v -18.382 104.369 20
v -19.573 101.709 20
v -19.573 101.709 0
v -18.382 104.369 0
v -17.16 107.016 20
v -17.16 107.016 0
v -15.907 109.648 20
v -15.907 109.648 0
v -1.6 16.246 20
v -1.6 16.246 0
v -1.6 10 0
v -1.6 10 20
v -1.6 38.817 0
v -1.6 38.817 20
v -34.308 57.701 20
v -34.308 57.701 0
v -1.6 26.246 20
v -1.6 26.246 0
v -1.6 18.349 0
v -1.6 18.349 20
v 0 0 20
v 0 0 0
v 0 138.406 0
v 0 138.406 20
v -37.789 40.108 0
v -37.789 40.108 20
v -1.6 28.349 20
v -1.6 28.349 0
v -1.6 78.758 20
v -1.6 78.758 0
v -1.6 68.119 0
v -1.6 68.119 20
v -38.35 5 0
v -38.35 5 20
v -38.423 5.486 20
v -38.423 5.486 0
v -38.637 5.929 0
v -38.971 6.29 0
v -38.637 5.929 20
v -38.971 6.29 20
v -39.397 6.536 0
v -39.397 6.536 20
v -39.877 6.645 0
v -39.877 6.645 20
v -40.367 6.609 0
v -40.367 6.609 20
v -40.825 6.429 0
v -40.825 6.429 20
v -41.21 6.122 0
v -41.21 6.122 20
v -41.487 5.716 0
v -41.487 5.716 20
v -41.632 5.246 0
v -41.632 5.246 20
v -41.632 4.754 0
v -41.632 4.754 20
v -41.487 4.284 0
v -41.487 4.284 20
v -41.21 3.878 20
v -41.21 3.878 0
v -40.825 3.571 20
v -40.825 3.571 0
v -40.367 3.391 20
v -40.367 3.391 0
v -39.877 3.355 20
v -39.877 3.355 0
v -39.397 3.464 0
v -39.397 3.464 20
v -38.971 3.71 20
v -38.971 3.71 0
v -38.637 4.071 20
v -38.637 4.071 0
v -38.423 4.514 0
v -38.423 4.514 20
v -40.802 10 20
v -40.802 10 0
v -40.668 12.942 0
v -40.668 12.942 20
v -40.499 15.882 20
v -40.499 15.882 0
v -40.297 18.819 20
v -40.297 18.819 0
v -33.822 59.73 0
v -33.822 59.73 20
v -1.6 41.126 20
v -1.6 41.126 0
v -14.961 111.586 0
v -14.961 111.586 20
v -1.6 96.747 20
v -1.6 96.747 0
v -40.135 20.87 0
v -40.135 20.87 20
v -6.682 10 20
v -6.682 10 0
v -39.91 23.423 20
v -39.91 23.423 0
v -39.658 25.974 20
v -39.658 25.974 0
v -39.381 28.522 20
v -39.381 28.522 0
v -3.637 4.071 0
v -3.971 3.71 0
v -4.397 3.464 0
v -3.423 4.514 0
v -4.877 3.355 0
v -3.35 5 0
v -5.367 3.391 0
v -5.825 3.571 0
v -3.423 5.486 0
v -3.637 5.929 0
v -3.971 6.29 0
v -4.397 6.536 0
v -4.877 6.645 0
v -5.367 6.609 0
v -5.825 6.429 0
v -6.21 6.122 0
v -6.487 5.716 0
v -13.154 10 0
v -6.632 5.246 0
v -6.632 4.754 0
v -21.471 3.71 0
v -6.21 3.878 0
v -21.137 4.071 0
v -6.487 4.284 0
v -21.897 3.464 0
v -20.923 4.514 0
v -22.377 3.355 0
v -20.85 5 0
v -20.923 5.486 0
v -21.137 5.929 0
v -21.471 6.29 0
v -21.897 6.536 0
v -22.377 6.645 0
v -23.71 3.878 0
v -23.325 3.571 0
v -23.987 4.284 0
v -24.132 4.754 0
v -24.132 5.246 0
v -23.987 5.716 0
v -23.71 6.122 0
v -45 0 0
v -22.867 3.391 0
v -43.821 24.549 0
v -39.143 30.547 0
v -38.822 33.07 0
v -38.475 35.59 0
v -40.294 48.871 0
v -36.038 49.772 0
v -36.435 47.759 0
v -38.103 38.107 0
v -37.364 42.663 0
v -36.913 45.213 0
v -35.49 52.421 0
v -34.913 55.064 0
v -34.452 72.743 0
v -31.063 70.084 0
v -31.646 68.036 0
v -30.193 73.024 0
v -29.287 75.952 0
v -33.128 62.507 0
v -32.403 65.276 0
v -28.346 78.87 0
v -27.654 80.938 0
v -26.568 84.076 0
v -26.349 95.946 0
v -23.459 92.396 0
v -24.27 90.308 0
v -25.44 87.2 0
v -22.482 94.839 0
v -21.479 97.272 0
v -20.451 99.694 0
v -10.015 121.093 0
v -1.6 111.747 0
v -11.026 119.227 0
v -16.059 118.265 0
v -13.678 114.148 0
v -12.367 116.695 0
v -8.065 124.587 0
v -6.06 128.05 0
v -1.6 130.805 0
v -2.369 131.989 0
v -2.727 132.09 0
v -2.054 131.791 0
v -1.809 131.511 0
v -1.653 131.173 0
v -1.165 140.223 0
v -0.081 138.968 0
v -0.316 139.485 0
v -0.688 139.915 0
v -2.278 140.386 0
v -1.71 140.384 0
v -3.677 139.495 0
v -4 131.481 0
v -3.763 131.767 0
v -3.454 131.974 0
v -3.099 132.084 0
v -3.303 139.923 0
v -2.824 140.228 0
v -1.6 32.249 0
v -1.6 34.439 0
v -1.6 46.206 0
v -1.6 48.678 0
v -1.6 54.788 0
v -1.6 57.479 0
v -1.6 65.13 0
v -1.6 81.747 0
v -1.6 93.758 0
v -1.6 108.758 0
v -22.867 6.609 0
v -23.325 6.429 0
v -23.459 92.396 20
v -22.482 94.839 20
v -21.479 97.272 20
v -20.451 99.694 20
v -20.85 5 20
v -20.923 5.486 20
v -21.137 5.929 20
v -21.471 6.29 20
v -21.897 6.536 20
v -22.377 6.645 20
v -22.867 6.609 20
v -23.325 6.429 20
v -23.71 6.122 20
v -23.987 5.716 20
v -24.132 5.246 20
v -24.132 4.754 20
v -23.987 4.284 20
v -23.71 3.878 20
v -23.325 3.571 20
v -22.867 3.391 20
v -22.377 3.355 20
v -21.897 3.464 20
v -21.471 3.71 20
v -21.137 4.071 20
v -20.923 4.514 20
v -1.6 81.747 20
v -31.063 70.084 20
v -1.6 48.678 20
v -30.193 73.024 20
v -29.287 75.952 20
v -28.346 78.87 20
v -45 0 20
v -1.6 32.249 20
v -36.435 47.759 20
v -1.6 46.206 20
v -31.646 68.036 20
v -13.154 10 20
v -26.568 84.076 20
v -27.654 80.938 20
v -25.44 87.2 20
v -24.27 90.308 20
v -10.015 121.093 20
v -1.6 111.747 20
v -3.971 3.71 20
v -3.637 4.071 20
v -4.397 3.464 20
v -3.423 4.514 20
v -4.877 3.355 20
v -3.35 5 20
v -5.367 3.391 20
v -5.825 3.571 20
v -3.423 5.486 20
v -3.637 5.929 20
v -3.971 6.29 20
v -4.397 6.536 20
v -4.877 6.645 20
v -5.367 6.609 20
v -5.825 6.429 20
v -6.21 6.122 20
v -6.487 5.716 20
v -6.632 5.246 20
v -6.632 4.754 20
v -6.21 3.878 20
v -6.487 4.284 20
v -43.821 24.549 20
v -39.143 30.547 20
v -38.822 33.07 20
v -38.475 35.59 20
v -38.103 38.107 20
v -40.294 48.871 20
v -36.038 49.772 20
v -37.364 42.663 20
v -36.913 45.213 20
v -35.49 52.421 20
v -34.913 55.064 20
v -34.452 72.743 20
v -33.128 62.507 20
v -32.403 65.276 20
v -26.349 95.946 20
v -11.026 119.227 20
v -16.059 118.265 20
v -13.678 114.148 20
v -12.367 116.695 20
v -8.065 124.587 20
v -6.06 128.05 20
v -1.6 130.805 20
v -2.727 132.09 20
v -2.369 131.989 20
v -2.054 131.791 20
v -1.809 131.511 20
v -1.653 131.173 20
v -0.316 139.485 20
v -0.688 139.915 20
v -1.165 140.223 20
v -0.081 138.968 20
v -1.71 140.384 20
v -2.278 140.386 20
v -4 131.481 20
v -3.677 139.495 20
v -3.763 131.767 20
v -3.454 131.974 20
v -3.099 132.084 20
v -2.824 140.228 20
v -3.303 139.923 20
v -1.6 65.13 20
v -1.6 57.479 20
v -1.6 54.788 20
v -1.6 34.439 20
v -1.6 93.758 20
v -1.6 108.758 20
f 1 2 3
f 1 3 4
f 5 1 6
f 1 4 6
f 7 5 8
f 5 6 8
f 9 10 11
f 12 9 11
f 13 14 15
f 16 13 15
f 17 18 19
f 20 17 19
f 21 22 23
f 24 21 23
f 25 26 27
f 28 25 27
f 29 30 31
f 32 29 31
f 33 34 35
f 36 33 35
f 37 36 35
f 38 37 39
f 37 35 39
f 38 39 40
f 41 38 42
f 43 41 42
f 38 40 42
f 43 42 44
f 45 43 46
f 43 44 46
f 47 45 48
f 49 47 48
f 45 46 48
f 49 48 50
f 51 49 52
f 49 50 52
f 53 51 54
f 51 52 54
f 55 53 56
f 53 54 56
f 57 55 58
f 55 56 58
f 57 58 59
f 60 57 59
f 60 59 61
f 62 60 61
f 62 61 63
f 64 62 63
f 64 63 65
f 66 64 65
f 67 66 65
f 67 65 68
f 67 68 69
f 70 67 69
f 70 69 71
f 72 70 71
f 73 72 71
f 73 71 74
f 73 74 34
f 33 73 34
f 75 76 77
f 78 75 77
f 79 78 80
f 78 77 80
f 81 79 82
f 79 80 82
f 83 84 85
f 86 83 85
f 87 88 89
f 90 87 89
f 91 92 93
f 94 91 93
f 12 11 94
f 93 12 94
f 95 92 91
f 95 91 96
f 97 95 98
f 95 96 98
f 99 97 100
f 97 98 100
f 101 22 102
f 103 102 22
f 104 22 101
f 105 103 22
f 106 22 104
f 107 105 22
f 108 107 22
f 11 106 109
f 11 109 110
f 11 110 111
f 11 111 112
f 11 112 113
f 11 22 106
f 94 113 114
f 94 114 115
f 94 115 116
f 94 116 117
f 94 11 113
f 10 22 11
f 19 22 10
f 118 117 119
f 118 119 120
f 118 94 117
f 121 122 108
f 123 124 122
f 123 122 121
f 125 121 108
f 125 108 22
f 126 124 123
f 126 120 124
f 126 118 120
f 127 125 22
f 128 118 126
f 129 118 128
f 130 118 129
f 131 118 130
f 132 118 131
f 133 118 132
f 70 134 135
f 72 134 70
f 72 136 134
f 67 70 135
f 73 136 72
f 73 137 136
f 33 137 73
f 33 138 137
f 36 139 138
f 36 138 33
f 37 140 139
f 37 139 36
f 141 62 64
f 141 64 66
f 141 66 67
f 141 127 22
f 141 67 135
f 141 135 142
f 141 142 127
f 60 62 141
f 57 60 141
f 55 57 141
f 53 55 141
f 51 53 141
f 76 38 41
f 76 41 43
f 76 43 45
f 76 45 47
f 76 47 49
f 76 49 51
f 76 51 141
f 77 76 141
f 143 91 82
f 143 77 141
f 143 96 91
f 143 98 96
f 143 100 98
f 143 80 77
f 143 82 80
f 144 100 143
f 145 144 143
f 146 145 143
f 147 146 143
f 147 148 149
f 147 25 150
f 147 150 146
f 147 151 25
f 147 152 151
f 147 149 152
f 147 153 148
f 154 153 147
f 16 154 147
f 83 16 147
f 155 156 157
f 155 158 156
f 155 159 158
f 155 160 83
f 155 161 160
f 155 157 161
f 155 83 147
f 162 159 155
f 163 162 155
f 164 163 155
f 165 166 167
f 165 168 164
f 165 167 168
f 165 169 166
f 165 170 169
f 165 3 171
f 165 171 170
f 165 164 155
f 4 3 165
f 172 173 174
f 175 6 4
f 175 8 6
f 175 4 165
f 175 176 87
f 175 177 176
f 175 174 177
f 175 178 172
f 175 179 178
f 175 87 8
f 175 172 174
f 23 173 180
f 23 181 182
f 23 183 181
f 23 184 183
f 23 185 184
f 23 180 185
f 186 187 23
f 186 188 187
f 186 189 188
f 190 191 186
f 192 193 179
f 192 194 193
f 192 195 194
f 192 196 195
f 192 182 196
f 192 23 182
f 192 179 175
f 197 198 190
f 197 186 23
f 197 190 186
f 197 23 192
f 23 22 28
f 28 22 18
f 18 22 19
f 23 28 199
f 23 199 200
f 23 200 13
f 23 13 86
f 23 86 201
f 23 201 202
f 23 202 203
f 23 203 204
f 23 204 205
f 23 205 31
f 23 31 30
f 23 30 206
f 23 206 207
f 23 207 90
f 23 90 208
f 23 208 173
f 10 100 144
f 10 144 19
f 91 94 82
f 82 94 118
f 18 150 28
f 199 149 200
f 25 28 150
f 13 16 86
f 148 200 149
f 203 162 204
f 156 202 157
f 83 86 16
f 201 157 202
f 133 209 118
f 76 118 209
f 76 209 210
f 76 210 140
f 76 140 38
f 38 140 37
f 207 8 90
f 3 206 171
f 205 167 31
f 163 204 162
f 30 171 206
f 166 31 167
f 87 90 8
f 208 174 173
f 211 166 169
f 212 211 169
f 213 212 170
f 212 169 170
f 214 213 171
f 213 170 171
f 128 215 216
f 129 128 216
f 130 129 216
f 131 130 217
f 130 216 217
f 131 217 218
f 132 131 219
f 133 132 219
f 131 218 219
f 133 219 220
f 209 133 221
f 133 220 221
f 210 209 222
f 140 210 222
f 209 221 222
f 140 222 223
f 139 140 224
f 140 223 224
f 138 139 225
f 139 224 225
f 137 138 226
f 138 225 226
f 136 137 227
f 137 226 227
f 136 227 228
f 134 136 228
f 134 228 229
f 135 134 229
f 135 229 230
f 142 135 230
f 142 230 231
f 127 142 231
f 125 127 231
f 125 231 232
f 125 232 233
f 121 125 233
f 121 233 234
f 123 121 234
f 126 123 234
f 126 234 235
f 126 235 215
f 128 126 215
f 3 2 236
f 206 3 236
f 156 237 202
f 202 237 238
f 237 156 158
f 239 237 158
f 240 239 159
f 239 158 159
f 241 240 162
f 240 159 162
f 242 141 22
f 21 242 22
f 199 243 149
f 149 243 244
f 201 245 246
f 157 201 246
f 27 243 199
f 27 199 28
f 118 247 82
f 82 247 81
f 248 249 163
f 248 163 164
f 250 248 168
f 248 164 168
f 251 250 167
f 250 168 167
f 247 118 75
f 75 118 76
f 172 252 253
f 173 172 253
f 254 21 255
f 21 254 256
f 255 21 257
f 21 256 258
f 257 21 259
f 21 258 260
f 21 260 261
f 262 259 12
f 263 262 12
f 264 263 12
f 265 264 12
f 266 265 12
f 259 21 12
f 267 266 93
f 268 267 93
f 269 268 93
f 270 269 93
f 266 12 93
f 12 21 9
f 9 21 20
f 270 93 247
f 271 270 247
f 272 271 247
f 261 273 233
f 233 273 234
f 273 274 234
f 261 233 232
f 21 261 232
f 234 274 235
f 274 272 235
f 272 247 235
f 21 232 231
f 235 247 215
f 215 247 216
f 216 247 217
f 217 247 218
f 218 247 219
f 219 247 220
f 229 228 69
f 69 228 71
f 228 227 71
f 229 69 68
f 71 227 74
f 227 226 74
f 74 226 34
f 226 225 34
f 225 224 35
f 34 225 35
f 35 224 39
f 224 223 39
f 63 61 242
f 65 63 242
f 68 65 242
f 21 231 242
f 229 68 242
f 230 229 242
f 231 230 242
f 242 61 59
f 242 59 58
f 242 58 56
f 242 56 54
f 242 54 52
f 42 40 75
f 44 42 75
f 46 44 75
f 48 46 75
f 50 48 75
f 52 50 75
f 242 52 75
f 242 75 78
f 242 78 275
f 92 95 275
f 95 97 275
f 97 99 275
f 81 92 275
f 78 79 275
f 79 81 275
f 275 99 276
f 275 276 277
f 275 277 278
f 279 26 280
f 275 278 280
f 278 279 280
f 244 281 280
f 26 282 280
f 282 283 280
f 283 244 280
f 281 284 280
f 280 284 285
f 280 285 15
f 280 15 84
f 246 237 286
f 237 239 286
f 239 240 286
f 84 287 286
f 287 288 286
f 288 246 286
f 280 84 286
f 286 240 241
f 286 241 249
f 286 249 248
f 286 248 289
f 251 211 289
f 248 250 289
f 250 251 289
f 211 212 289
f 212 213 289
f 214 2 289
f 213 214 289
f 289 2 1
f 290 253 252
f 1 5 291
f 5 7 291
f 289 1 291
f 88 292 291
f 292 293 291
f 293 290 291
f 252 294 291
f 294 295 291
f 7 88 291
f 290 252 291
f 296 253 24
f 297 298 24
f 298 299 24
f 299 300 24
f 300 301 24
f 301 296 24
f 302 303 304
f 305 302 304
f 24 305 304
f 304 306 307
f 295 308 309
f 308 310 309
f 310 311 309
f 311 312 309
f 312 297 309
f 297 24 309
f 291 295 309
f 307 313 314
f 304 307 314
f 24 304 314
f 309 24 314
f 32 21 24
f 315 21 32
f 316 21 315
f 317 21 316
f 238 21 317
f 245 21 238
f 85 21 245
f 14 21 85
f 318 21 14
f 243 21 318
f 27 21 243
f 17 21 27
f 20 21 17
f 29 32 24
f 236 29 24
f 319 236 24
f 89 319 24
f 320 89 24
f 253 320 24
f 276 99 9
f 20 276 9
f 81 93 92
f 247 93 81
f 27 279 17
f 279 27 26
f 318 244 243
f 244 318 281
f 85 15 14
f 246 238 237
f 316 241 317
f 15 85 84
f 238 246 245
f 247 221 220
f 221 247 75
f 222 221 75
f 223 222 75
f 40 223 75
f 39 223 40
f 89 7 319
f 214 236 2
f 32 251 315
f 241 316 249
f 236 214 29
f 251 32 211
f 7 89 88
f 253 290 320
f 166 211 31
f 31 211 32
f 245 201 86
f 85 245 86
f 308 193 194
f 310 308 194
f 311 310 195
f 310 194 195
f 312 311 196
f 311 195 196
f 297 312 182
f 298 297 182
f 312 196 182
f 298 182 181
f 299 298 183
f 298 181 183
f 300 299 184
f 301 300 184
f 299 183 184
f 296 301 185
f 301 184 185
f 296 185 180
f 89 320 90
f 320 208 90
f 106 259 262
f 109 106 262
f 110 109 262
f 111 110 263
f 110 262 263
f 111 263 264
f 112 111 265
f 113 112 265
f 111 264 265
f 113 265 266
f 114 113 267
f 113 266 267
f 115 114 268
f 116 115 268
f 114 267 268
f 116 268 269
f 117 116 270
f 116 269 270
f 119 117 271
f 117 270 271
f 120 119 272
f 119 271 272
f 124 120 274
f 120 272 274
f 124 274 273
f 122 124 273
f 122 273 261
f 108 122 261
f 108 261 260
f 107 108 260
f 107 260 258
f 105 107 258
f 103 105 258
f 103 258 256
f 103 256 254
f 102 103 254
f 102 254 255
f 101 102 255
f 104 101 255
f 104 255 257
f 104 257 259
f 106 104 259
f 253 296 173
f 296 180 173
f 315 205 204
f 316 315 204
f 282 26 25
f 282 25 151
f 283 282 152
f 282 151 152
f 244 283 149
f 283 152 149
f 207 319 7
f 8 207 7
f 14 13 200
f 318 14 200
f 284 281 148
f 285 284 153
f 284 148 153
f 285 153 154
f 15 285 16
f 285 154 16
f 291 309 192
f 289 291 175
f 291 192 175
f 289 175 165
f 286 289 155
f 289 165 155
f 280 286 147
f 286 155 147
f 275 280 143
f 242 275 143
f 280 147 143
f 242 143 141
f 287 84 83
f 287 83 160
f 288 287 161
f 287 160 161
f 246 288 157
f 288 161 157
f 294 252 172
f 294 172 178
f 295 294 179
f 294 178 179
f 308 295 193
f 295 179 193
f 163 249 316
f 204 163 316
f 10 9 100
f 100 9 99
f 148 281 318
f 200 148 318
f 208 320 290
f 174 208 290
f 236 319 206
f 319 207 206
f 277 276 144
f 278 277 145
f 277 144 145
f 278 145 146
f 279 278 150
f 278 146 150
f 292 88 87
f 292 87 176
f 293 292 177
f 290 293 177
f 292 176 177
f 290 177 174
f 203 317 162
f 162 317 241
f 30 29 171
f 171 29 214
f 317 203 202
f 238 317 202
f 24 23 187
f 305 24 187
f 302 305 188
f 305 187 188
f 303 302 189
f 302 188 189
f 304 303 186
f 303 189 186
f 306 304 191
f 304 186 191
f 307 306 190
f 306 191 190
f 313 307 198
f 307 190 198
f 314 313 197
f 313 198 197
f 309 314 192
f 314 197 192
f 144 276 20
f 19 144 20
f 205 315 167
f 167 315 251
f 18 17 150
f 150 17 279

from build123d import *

# Parameters (mm, degrees)
BOSS_EXTRUDE4_DEPTH = 20
SKETCH12_R          = 1.65
CUT_EXTRUDE1_DEPTH  = 149.790905386
CUT_EXTRUDE2_START  = -20
CUT_EXTRUDE2_DEPTH  = 20
CUT_EXTRUDE3_START  = -30
CUT_EXTRUDE3_DEPTH  = 30
BOSS_EXTRUDE5_DEPTH = 20
CIRPATTERN1_COUNT   = 6
CIRPATTERN1_ANGLE   = 30
LPATTERN2_COUNT     = 3
LPATTERN2_PITCH     = 10
BOSS_EXTRUDE6_DEPTH = 20
LPATTERN3_COUNT     = 3
LPATTERN3_PITCH     = 15
CUT_EXTRUDE4_START  = -20
CUT_EXTRUDE4_DEPTH  = 20


with BuildPart() as part:
    # Sketch5 → Boss-Extrude4 (new body)
    with BuildSketch(Plane.XY):
        with BuildLine():
            Line((0, 0), (0, 138.405603612))
            ThreePointArc((0, 138.405603612), (-1.431938837, 140.323234054), (-3.677306515, 139.494934991))
            ThreePointArc((-3.677306515, 139.494934991), (-34.45212059, 72.743387818), (-45, 0))
            Line((-45, 0), (0, 0))
        make_face()
        with BuildLine():
            Line((-1.6, 10), (-40.801596678, 10))
            ThreePointArc((-40.801596678, 10), (-30.171322984, 73.09445494), (-4, 131.480881584))
            ThreePointArc((-4, 131.480881584), (-2.54422163, 132.052107892), (-1.6, 130.805498221))
            Line((-1.6, 130.805498221), (-1.6, 10))
        make_face(mode=Mode.SUBTRACT)
    extrude(amount=BOSS_EXTRUDE4_DEPTH)

    # Sketch12 → Cut-Extrude1 (cut, through all)
    with BuildSketch(Plane.XY.offset(20)):
        with Locations((-40, 5)):
            Circle(SKETCH12_R)
        with Locations((-22.5, 5)):
            Circle(SKETCH12_R)
        with Locations((-5, 5)):
            Circle(SKETCH12_R)
    extrude(amount=-CUT_EXTRUDE1_DEPTH, mode=Mode.SUBTRACT)

    # Sketch17 → Cut-Extrude2 (cut)
    with BuildSketch(Plane.XY.offset(20).offset(CUT_EXTRUDE2_START)):
        Polygon((-109.129206393, -31.174044695), (890.870793607, -18.386269912), (884.13367644, 508.454191469), (-120.638203698, 868.825955305), (-717.462714608, 272.001444394), align=None)
        with BuildLine():
            Line((-45, 0), (0, 0))
            Line((0, 0), (0, 138.405603612))
            ThreePointArc((0, 138.405603612), (-0.890765175, 140.069814567), (-2.769598102, 140.25160436))
            ThreePointArc((-2.769598102, 140.25160436), (-57.041683198, 80.109492203), (-45, 0))
        make_face(mode=Mode.SUBTRACT)
    extrude(amount=CUT_EXTRUDE2_DEPTH, mode=Mode.SUBTRACT)

    # Sketch18 → Cut-Extrude3 (cut)
    with BuildSketch(Plane.XY.offset(20).offset(CUT_EXTRUDE3_START)):
        Polygon((10.567687301, -7.152622061), (26.572035637, 318.782087337), (-234.729728554, 306.471050155), (-205.798791176, -46.855716973), align=None)
        with BuildLine():
            Line((-45, 0), (0, 0))
            Line((0, 0), (0, 138.405603612))
            ThreePointArc((0, 138.405603612), (-1.431938837, 140.323234054), (-3.677306515, 139.494934991))
            ThreePointArc((-3.677306515, 139.494934991), (-34.45212059, 72.743387818), (-45, 0))
        make_face(mode=Mode.SUBTRACT)
    extrude(amount=CUT_EXTRUDE3_DEPTH, mode=Mode.SUBTRACT)

    # Sketch14 → Boss-Extrude5 (add)
    with BuildSketch(Plane.XY.offset(20)):
        Polygon((48.4, 10), (-114.101488266, 62.799934205), (-113.483454278, 64.702047237), (49.018033989, 11.902113033), align=None)
    boss_extrude5 = extrude(amount=-BOSS_EXTRUDE5_DEPTH)

    # CirPattern1: Boss-Extrude5 ×6 about axis
    cirpattern1_axis = Axis((49.018033989, 11.902113033, 0), (0, 0, -1))
    for i in range(1, CIRPATTERN1_COUNT):
        add(boss_extrude5.rotate(cirpattern1_axis, i * CIRPATTERN1_ANGLE / (CIRPATTERN1_COUNT - 1)))

    # LPattern2: Boss-Extrude5 ×3
    with Locations(*[(0, -i * LPATTERN2_PITCH, 0) for i in range(1, LPATTERN2_COUNT)]):
        add(boss_extrude5)

    # Sketch19 → Boss-Extrude6 (add)
    with BuildSketch(Plane.XY.offset(20)):
        Polygon((-1.6, 78.758131997), (-60.025016892, 143.645686936), (-58.538727241, 144.983948149), (-0.113710349, 80.096393209), align=None)
    boss_extrude6 = extrude(amount=-BOSS_EXTRUDE6_DEPTH)

    # LPattern3: Boss-Extrude6 ×3
    with Locations(*[(0, i * LPATTERN3_PITCH, 0) for i in range(1, LPATTERN3_COUNT)]):
        add(boss_extrude6)

    # Sketch20 → Cut-Extrude4 (cut)
    with BuildSketch(Plane.XY.offset(20).offset(CUT_EXTRUDE4_START)):
        Polygon((77.475806055, -29.017161833), (-265.551297842, 6.523481062), (-137.36538358, 367.52057294), (154.147754773, 113.145409747), align=None)
        with BuildLine():
            Line((-45, 0), (0, 0))
            Line((0, 0), (0, 138.405603612))
            ThreePointArc((0, 138.405603612), (-1.431938837, 140.323234054), (-3.677306515, 139.494934991))
            ThreePointArc((-3.677306515, 139.494934991), (-34.45212059, 72.743387818), (-45, 0))
        make_face(mode=Mode.SUBTRACT)
    extrude(amount=CUT_EXTRUDE4_DEPTH, mode=Mode.SUBTRACT)


solid = part.part
